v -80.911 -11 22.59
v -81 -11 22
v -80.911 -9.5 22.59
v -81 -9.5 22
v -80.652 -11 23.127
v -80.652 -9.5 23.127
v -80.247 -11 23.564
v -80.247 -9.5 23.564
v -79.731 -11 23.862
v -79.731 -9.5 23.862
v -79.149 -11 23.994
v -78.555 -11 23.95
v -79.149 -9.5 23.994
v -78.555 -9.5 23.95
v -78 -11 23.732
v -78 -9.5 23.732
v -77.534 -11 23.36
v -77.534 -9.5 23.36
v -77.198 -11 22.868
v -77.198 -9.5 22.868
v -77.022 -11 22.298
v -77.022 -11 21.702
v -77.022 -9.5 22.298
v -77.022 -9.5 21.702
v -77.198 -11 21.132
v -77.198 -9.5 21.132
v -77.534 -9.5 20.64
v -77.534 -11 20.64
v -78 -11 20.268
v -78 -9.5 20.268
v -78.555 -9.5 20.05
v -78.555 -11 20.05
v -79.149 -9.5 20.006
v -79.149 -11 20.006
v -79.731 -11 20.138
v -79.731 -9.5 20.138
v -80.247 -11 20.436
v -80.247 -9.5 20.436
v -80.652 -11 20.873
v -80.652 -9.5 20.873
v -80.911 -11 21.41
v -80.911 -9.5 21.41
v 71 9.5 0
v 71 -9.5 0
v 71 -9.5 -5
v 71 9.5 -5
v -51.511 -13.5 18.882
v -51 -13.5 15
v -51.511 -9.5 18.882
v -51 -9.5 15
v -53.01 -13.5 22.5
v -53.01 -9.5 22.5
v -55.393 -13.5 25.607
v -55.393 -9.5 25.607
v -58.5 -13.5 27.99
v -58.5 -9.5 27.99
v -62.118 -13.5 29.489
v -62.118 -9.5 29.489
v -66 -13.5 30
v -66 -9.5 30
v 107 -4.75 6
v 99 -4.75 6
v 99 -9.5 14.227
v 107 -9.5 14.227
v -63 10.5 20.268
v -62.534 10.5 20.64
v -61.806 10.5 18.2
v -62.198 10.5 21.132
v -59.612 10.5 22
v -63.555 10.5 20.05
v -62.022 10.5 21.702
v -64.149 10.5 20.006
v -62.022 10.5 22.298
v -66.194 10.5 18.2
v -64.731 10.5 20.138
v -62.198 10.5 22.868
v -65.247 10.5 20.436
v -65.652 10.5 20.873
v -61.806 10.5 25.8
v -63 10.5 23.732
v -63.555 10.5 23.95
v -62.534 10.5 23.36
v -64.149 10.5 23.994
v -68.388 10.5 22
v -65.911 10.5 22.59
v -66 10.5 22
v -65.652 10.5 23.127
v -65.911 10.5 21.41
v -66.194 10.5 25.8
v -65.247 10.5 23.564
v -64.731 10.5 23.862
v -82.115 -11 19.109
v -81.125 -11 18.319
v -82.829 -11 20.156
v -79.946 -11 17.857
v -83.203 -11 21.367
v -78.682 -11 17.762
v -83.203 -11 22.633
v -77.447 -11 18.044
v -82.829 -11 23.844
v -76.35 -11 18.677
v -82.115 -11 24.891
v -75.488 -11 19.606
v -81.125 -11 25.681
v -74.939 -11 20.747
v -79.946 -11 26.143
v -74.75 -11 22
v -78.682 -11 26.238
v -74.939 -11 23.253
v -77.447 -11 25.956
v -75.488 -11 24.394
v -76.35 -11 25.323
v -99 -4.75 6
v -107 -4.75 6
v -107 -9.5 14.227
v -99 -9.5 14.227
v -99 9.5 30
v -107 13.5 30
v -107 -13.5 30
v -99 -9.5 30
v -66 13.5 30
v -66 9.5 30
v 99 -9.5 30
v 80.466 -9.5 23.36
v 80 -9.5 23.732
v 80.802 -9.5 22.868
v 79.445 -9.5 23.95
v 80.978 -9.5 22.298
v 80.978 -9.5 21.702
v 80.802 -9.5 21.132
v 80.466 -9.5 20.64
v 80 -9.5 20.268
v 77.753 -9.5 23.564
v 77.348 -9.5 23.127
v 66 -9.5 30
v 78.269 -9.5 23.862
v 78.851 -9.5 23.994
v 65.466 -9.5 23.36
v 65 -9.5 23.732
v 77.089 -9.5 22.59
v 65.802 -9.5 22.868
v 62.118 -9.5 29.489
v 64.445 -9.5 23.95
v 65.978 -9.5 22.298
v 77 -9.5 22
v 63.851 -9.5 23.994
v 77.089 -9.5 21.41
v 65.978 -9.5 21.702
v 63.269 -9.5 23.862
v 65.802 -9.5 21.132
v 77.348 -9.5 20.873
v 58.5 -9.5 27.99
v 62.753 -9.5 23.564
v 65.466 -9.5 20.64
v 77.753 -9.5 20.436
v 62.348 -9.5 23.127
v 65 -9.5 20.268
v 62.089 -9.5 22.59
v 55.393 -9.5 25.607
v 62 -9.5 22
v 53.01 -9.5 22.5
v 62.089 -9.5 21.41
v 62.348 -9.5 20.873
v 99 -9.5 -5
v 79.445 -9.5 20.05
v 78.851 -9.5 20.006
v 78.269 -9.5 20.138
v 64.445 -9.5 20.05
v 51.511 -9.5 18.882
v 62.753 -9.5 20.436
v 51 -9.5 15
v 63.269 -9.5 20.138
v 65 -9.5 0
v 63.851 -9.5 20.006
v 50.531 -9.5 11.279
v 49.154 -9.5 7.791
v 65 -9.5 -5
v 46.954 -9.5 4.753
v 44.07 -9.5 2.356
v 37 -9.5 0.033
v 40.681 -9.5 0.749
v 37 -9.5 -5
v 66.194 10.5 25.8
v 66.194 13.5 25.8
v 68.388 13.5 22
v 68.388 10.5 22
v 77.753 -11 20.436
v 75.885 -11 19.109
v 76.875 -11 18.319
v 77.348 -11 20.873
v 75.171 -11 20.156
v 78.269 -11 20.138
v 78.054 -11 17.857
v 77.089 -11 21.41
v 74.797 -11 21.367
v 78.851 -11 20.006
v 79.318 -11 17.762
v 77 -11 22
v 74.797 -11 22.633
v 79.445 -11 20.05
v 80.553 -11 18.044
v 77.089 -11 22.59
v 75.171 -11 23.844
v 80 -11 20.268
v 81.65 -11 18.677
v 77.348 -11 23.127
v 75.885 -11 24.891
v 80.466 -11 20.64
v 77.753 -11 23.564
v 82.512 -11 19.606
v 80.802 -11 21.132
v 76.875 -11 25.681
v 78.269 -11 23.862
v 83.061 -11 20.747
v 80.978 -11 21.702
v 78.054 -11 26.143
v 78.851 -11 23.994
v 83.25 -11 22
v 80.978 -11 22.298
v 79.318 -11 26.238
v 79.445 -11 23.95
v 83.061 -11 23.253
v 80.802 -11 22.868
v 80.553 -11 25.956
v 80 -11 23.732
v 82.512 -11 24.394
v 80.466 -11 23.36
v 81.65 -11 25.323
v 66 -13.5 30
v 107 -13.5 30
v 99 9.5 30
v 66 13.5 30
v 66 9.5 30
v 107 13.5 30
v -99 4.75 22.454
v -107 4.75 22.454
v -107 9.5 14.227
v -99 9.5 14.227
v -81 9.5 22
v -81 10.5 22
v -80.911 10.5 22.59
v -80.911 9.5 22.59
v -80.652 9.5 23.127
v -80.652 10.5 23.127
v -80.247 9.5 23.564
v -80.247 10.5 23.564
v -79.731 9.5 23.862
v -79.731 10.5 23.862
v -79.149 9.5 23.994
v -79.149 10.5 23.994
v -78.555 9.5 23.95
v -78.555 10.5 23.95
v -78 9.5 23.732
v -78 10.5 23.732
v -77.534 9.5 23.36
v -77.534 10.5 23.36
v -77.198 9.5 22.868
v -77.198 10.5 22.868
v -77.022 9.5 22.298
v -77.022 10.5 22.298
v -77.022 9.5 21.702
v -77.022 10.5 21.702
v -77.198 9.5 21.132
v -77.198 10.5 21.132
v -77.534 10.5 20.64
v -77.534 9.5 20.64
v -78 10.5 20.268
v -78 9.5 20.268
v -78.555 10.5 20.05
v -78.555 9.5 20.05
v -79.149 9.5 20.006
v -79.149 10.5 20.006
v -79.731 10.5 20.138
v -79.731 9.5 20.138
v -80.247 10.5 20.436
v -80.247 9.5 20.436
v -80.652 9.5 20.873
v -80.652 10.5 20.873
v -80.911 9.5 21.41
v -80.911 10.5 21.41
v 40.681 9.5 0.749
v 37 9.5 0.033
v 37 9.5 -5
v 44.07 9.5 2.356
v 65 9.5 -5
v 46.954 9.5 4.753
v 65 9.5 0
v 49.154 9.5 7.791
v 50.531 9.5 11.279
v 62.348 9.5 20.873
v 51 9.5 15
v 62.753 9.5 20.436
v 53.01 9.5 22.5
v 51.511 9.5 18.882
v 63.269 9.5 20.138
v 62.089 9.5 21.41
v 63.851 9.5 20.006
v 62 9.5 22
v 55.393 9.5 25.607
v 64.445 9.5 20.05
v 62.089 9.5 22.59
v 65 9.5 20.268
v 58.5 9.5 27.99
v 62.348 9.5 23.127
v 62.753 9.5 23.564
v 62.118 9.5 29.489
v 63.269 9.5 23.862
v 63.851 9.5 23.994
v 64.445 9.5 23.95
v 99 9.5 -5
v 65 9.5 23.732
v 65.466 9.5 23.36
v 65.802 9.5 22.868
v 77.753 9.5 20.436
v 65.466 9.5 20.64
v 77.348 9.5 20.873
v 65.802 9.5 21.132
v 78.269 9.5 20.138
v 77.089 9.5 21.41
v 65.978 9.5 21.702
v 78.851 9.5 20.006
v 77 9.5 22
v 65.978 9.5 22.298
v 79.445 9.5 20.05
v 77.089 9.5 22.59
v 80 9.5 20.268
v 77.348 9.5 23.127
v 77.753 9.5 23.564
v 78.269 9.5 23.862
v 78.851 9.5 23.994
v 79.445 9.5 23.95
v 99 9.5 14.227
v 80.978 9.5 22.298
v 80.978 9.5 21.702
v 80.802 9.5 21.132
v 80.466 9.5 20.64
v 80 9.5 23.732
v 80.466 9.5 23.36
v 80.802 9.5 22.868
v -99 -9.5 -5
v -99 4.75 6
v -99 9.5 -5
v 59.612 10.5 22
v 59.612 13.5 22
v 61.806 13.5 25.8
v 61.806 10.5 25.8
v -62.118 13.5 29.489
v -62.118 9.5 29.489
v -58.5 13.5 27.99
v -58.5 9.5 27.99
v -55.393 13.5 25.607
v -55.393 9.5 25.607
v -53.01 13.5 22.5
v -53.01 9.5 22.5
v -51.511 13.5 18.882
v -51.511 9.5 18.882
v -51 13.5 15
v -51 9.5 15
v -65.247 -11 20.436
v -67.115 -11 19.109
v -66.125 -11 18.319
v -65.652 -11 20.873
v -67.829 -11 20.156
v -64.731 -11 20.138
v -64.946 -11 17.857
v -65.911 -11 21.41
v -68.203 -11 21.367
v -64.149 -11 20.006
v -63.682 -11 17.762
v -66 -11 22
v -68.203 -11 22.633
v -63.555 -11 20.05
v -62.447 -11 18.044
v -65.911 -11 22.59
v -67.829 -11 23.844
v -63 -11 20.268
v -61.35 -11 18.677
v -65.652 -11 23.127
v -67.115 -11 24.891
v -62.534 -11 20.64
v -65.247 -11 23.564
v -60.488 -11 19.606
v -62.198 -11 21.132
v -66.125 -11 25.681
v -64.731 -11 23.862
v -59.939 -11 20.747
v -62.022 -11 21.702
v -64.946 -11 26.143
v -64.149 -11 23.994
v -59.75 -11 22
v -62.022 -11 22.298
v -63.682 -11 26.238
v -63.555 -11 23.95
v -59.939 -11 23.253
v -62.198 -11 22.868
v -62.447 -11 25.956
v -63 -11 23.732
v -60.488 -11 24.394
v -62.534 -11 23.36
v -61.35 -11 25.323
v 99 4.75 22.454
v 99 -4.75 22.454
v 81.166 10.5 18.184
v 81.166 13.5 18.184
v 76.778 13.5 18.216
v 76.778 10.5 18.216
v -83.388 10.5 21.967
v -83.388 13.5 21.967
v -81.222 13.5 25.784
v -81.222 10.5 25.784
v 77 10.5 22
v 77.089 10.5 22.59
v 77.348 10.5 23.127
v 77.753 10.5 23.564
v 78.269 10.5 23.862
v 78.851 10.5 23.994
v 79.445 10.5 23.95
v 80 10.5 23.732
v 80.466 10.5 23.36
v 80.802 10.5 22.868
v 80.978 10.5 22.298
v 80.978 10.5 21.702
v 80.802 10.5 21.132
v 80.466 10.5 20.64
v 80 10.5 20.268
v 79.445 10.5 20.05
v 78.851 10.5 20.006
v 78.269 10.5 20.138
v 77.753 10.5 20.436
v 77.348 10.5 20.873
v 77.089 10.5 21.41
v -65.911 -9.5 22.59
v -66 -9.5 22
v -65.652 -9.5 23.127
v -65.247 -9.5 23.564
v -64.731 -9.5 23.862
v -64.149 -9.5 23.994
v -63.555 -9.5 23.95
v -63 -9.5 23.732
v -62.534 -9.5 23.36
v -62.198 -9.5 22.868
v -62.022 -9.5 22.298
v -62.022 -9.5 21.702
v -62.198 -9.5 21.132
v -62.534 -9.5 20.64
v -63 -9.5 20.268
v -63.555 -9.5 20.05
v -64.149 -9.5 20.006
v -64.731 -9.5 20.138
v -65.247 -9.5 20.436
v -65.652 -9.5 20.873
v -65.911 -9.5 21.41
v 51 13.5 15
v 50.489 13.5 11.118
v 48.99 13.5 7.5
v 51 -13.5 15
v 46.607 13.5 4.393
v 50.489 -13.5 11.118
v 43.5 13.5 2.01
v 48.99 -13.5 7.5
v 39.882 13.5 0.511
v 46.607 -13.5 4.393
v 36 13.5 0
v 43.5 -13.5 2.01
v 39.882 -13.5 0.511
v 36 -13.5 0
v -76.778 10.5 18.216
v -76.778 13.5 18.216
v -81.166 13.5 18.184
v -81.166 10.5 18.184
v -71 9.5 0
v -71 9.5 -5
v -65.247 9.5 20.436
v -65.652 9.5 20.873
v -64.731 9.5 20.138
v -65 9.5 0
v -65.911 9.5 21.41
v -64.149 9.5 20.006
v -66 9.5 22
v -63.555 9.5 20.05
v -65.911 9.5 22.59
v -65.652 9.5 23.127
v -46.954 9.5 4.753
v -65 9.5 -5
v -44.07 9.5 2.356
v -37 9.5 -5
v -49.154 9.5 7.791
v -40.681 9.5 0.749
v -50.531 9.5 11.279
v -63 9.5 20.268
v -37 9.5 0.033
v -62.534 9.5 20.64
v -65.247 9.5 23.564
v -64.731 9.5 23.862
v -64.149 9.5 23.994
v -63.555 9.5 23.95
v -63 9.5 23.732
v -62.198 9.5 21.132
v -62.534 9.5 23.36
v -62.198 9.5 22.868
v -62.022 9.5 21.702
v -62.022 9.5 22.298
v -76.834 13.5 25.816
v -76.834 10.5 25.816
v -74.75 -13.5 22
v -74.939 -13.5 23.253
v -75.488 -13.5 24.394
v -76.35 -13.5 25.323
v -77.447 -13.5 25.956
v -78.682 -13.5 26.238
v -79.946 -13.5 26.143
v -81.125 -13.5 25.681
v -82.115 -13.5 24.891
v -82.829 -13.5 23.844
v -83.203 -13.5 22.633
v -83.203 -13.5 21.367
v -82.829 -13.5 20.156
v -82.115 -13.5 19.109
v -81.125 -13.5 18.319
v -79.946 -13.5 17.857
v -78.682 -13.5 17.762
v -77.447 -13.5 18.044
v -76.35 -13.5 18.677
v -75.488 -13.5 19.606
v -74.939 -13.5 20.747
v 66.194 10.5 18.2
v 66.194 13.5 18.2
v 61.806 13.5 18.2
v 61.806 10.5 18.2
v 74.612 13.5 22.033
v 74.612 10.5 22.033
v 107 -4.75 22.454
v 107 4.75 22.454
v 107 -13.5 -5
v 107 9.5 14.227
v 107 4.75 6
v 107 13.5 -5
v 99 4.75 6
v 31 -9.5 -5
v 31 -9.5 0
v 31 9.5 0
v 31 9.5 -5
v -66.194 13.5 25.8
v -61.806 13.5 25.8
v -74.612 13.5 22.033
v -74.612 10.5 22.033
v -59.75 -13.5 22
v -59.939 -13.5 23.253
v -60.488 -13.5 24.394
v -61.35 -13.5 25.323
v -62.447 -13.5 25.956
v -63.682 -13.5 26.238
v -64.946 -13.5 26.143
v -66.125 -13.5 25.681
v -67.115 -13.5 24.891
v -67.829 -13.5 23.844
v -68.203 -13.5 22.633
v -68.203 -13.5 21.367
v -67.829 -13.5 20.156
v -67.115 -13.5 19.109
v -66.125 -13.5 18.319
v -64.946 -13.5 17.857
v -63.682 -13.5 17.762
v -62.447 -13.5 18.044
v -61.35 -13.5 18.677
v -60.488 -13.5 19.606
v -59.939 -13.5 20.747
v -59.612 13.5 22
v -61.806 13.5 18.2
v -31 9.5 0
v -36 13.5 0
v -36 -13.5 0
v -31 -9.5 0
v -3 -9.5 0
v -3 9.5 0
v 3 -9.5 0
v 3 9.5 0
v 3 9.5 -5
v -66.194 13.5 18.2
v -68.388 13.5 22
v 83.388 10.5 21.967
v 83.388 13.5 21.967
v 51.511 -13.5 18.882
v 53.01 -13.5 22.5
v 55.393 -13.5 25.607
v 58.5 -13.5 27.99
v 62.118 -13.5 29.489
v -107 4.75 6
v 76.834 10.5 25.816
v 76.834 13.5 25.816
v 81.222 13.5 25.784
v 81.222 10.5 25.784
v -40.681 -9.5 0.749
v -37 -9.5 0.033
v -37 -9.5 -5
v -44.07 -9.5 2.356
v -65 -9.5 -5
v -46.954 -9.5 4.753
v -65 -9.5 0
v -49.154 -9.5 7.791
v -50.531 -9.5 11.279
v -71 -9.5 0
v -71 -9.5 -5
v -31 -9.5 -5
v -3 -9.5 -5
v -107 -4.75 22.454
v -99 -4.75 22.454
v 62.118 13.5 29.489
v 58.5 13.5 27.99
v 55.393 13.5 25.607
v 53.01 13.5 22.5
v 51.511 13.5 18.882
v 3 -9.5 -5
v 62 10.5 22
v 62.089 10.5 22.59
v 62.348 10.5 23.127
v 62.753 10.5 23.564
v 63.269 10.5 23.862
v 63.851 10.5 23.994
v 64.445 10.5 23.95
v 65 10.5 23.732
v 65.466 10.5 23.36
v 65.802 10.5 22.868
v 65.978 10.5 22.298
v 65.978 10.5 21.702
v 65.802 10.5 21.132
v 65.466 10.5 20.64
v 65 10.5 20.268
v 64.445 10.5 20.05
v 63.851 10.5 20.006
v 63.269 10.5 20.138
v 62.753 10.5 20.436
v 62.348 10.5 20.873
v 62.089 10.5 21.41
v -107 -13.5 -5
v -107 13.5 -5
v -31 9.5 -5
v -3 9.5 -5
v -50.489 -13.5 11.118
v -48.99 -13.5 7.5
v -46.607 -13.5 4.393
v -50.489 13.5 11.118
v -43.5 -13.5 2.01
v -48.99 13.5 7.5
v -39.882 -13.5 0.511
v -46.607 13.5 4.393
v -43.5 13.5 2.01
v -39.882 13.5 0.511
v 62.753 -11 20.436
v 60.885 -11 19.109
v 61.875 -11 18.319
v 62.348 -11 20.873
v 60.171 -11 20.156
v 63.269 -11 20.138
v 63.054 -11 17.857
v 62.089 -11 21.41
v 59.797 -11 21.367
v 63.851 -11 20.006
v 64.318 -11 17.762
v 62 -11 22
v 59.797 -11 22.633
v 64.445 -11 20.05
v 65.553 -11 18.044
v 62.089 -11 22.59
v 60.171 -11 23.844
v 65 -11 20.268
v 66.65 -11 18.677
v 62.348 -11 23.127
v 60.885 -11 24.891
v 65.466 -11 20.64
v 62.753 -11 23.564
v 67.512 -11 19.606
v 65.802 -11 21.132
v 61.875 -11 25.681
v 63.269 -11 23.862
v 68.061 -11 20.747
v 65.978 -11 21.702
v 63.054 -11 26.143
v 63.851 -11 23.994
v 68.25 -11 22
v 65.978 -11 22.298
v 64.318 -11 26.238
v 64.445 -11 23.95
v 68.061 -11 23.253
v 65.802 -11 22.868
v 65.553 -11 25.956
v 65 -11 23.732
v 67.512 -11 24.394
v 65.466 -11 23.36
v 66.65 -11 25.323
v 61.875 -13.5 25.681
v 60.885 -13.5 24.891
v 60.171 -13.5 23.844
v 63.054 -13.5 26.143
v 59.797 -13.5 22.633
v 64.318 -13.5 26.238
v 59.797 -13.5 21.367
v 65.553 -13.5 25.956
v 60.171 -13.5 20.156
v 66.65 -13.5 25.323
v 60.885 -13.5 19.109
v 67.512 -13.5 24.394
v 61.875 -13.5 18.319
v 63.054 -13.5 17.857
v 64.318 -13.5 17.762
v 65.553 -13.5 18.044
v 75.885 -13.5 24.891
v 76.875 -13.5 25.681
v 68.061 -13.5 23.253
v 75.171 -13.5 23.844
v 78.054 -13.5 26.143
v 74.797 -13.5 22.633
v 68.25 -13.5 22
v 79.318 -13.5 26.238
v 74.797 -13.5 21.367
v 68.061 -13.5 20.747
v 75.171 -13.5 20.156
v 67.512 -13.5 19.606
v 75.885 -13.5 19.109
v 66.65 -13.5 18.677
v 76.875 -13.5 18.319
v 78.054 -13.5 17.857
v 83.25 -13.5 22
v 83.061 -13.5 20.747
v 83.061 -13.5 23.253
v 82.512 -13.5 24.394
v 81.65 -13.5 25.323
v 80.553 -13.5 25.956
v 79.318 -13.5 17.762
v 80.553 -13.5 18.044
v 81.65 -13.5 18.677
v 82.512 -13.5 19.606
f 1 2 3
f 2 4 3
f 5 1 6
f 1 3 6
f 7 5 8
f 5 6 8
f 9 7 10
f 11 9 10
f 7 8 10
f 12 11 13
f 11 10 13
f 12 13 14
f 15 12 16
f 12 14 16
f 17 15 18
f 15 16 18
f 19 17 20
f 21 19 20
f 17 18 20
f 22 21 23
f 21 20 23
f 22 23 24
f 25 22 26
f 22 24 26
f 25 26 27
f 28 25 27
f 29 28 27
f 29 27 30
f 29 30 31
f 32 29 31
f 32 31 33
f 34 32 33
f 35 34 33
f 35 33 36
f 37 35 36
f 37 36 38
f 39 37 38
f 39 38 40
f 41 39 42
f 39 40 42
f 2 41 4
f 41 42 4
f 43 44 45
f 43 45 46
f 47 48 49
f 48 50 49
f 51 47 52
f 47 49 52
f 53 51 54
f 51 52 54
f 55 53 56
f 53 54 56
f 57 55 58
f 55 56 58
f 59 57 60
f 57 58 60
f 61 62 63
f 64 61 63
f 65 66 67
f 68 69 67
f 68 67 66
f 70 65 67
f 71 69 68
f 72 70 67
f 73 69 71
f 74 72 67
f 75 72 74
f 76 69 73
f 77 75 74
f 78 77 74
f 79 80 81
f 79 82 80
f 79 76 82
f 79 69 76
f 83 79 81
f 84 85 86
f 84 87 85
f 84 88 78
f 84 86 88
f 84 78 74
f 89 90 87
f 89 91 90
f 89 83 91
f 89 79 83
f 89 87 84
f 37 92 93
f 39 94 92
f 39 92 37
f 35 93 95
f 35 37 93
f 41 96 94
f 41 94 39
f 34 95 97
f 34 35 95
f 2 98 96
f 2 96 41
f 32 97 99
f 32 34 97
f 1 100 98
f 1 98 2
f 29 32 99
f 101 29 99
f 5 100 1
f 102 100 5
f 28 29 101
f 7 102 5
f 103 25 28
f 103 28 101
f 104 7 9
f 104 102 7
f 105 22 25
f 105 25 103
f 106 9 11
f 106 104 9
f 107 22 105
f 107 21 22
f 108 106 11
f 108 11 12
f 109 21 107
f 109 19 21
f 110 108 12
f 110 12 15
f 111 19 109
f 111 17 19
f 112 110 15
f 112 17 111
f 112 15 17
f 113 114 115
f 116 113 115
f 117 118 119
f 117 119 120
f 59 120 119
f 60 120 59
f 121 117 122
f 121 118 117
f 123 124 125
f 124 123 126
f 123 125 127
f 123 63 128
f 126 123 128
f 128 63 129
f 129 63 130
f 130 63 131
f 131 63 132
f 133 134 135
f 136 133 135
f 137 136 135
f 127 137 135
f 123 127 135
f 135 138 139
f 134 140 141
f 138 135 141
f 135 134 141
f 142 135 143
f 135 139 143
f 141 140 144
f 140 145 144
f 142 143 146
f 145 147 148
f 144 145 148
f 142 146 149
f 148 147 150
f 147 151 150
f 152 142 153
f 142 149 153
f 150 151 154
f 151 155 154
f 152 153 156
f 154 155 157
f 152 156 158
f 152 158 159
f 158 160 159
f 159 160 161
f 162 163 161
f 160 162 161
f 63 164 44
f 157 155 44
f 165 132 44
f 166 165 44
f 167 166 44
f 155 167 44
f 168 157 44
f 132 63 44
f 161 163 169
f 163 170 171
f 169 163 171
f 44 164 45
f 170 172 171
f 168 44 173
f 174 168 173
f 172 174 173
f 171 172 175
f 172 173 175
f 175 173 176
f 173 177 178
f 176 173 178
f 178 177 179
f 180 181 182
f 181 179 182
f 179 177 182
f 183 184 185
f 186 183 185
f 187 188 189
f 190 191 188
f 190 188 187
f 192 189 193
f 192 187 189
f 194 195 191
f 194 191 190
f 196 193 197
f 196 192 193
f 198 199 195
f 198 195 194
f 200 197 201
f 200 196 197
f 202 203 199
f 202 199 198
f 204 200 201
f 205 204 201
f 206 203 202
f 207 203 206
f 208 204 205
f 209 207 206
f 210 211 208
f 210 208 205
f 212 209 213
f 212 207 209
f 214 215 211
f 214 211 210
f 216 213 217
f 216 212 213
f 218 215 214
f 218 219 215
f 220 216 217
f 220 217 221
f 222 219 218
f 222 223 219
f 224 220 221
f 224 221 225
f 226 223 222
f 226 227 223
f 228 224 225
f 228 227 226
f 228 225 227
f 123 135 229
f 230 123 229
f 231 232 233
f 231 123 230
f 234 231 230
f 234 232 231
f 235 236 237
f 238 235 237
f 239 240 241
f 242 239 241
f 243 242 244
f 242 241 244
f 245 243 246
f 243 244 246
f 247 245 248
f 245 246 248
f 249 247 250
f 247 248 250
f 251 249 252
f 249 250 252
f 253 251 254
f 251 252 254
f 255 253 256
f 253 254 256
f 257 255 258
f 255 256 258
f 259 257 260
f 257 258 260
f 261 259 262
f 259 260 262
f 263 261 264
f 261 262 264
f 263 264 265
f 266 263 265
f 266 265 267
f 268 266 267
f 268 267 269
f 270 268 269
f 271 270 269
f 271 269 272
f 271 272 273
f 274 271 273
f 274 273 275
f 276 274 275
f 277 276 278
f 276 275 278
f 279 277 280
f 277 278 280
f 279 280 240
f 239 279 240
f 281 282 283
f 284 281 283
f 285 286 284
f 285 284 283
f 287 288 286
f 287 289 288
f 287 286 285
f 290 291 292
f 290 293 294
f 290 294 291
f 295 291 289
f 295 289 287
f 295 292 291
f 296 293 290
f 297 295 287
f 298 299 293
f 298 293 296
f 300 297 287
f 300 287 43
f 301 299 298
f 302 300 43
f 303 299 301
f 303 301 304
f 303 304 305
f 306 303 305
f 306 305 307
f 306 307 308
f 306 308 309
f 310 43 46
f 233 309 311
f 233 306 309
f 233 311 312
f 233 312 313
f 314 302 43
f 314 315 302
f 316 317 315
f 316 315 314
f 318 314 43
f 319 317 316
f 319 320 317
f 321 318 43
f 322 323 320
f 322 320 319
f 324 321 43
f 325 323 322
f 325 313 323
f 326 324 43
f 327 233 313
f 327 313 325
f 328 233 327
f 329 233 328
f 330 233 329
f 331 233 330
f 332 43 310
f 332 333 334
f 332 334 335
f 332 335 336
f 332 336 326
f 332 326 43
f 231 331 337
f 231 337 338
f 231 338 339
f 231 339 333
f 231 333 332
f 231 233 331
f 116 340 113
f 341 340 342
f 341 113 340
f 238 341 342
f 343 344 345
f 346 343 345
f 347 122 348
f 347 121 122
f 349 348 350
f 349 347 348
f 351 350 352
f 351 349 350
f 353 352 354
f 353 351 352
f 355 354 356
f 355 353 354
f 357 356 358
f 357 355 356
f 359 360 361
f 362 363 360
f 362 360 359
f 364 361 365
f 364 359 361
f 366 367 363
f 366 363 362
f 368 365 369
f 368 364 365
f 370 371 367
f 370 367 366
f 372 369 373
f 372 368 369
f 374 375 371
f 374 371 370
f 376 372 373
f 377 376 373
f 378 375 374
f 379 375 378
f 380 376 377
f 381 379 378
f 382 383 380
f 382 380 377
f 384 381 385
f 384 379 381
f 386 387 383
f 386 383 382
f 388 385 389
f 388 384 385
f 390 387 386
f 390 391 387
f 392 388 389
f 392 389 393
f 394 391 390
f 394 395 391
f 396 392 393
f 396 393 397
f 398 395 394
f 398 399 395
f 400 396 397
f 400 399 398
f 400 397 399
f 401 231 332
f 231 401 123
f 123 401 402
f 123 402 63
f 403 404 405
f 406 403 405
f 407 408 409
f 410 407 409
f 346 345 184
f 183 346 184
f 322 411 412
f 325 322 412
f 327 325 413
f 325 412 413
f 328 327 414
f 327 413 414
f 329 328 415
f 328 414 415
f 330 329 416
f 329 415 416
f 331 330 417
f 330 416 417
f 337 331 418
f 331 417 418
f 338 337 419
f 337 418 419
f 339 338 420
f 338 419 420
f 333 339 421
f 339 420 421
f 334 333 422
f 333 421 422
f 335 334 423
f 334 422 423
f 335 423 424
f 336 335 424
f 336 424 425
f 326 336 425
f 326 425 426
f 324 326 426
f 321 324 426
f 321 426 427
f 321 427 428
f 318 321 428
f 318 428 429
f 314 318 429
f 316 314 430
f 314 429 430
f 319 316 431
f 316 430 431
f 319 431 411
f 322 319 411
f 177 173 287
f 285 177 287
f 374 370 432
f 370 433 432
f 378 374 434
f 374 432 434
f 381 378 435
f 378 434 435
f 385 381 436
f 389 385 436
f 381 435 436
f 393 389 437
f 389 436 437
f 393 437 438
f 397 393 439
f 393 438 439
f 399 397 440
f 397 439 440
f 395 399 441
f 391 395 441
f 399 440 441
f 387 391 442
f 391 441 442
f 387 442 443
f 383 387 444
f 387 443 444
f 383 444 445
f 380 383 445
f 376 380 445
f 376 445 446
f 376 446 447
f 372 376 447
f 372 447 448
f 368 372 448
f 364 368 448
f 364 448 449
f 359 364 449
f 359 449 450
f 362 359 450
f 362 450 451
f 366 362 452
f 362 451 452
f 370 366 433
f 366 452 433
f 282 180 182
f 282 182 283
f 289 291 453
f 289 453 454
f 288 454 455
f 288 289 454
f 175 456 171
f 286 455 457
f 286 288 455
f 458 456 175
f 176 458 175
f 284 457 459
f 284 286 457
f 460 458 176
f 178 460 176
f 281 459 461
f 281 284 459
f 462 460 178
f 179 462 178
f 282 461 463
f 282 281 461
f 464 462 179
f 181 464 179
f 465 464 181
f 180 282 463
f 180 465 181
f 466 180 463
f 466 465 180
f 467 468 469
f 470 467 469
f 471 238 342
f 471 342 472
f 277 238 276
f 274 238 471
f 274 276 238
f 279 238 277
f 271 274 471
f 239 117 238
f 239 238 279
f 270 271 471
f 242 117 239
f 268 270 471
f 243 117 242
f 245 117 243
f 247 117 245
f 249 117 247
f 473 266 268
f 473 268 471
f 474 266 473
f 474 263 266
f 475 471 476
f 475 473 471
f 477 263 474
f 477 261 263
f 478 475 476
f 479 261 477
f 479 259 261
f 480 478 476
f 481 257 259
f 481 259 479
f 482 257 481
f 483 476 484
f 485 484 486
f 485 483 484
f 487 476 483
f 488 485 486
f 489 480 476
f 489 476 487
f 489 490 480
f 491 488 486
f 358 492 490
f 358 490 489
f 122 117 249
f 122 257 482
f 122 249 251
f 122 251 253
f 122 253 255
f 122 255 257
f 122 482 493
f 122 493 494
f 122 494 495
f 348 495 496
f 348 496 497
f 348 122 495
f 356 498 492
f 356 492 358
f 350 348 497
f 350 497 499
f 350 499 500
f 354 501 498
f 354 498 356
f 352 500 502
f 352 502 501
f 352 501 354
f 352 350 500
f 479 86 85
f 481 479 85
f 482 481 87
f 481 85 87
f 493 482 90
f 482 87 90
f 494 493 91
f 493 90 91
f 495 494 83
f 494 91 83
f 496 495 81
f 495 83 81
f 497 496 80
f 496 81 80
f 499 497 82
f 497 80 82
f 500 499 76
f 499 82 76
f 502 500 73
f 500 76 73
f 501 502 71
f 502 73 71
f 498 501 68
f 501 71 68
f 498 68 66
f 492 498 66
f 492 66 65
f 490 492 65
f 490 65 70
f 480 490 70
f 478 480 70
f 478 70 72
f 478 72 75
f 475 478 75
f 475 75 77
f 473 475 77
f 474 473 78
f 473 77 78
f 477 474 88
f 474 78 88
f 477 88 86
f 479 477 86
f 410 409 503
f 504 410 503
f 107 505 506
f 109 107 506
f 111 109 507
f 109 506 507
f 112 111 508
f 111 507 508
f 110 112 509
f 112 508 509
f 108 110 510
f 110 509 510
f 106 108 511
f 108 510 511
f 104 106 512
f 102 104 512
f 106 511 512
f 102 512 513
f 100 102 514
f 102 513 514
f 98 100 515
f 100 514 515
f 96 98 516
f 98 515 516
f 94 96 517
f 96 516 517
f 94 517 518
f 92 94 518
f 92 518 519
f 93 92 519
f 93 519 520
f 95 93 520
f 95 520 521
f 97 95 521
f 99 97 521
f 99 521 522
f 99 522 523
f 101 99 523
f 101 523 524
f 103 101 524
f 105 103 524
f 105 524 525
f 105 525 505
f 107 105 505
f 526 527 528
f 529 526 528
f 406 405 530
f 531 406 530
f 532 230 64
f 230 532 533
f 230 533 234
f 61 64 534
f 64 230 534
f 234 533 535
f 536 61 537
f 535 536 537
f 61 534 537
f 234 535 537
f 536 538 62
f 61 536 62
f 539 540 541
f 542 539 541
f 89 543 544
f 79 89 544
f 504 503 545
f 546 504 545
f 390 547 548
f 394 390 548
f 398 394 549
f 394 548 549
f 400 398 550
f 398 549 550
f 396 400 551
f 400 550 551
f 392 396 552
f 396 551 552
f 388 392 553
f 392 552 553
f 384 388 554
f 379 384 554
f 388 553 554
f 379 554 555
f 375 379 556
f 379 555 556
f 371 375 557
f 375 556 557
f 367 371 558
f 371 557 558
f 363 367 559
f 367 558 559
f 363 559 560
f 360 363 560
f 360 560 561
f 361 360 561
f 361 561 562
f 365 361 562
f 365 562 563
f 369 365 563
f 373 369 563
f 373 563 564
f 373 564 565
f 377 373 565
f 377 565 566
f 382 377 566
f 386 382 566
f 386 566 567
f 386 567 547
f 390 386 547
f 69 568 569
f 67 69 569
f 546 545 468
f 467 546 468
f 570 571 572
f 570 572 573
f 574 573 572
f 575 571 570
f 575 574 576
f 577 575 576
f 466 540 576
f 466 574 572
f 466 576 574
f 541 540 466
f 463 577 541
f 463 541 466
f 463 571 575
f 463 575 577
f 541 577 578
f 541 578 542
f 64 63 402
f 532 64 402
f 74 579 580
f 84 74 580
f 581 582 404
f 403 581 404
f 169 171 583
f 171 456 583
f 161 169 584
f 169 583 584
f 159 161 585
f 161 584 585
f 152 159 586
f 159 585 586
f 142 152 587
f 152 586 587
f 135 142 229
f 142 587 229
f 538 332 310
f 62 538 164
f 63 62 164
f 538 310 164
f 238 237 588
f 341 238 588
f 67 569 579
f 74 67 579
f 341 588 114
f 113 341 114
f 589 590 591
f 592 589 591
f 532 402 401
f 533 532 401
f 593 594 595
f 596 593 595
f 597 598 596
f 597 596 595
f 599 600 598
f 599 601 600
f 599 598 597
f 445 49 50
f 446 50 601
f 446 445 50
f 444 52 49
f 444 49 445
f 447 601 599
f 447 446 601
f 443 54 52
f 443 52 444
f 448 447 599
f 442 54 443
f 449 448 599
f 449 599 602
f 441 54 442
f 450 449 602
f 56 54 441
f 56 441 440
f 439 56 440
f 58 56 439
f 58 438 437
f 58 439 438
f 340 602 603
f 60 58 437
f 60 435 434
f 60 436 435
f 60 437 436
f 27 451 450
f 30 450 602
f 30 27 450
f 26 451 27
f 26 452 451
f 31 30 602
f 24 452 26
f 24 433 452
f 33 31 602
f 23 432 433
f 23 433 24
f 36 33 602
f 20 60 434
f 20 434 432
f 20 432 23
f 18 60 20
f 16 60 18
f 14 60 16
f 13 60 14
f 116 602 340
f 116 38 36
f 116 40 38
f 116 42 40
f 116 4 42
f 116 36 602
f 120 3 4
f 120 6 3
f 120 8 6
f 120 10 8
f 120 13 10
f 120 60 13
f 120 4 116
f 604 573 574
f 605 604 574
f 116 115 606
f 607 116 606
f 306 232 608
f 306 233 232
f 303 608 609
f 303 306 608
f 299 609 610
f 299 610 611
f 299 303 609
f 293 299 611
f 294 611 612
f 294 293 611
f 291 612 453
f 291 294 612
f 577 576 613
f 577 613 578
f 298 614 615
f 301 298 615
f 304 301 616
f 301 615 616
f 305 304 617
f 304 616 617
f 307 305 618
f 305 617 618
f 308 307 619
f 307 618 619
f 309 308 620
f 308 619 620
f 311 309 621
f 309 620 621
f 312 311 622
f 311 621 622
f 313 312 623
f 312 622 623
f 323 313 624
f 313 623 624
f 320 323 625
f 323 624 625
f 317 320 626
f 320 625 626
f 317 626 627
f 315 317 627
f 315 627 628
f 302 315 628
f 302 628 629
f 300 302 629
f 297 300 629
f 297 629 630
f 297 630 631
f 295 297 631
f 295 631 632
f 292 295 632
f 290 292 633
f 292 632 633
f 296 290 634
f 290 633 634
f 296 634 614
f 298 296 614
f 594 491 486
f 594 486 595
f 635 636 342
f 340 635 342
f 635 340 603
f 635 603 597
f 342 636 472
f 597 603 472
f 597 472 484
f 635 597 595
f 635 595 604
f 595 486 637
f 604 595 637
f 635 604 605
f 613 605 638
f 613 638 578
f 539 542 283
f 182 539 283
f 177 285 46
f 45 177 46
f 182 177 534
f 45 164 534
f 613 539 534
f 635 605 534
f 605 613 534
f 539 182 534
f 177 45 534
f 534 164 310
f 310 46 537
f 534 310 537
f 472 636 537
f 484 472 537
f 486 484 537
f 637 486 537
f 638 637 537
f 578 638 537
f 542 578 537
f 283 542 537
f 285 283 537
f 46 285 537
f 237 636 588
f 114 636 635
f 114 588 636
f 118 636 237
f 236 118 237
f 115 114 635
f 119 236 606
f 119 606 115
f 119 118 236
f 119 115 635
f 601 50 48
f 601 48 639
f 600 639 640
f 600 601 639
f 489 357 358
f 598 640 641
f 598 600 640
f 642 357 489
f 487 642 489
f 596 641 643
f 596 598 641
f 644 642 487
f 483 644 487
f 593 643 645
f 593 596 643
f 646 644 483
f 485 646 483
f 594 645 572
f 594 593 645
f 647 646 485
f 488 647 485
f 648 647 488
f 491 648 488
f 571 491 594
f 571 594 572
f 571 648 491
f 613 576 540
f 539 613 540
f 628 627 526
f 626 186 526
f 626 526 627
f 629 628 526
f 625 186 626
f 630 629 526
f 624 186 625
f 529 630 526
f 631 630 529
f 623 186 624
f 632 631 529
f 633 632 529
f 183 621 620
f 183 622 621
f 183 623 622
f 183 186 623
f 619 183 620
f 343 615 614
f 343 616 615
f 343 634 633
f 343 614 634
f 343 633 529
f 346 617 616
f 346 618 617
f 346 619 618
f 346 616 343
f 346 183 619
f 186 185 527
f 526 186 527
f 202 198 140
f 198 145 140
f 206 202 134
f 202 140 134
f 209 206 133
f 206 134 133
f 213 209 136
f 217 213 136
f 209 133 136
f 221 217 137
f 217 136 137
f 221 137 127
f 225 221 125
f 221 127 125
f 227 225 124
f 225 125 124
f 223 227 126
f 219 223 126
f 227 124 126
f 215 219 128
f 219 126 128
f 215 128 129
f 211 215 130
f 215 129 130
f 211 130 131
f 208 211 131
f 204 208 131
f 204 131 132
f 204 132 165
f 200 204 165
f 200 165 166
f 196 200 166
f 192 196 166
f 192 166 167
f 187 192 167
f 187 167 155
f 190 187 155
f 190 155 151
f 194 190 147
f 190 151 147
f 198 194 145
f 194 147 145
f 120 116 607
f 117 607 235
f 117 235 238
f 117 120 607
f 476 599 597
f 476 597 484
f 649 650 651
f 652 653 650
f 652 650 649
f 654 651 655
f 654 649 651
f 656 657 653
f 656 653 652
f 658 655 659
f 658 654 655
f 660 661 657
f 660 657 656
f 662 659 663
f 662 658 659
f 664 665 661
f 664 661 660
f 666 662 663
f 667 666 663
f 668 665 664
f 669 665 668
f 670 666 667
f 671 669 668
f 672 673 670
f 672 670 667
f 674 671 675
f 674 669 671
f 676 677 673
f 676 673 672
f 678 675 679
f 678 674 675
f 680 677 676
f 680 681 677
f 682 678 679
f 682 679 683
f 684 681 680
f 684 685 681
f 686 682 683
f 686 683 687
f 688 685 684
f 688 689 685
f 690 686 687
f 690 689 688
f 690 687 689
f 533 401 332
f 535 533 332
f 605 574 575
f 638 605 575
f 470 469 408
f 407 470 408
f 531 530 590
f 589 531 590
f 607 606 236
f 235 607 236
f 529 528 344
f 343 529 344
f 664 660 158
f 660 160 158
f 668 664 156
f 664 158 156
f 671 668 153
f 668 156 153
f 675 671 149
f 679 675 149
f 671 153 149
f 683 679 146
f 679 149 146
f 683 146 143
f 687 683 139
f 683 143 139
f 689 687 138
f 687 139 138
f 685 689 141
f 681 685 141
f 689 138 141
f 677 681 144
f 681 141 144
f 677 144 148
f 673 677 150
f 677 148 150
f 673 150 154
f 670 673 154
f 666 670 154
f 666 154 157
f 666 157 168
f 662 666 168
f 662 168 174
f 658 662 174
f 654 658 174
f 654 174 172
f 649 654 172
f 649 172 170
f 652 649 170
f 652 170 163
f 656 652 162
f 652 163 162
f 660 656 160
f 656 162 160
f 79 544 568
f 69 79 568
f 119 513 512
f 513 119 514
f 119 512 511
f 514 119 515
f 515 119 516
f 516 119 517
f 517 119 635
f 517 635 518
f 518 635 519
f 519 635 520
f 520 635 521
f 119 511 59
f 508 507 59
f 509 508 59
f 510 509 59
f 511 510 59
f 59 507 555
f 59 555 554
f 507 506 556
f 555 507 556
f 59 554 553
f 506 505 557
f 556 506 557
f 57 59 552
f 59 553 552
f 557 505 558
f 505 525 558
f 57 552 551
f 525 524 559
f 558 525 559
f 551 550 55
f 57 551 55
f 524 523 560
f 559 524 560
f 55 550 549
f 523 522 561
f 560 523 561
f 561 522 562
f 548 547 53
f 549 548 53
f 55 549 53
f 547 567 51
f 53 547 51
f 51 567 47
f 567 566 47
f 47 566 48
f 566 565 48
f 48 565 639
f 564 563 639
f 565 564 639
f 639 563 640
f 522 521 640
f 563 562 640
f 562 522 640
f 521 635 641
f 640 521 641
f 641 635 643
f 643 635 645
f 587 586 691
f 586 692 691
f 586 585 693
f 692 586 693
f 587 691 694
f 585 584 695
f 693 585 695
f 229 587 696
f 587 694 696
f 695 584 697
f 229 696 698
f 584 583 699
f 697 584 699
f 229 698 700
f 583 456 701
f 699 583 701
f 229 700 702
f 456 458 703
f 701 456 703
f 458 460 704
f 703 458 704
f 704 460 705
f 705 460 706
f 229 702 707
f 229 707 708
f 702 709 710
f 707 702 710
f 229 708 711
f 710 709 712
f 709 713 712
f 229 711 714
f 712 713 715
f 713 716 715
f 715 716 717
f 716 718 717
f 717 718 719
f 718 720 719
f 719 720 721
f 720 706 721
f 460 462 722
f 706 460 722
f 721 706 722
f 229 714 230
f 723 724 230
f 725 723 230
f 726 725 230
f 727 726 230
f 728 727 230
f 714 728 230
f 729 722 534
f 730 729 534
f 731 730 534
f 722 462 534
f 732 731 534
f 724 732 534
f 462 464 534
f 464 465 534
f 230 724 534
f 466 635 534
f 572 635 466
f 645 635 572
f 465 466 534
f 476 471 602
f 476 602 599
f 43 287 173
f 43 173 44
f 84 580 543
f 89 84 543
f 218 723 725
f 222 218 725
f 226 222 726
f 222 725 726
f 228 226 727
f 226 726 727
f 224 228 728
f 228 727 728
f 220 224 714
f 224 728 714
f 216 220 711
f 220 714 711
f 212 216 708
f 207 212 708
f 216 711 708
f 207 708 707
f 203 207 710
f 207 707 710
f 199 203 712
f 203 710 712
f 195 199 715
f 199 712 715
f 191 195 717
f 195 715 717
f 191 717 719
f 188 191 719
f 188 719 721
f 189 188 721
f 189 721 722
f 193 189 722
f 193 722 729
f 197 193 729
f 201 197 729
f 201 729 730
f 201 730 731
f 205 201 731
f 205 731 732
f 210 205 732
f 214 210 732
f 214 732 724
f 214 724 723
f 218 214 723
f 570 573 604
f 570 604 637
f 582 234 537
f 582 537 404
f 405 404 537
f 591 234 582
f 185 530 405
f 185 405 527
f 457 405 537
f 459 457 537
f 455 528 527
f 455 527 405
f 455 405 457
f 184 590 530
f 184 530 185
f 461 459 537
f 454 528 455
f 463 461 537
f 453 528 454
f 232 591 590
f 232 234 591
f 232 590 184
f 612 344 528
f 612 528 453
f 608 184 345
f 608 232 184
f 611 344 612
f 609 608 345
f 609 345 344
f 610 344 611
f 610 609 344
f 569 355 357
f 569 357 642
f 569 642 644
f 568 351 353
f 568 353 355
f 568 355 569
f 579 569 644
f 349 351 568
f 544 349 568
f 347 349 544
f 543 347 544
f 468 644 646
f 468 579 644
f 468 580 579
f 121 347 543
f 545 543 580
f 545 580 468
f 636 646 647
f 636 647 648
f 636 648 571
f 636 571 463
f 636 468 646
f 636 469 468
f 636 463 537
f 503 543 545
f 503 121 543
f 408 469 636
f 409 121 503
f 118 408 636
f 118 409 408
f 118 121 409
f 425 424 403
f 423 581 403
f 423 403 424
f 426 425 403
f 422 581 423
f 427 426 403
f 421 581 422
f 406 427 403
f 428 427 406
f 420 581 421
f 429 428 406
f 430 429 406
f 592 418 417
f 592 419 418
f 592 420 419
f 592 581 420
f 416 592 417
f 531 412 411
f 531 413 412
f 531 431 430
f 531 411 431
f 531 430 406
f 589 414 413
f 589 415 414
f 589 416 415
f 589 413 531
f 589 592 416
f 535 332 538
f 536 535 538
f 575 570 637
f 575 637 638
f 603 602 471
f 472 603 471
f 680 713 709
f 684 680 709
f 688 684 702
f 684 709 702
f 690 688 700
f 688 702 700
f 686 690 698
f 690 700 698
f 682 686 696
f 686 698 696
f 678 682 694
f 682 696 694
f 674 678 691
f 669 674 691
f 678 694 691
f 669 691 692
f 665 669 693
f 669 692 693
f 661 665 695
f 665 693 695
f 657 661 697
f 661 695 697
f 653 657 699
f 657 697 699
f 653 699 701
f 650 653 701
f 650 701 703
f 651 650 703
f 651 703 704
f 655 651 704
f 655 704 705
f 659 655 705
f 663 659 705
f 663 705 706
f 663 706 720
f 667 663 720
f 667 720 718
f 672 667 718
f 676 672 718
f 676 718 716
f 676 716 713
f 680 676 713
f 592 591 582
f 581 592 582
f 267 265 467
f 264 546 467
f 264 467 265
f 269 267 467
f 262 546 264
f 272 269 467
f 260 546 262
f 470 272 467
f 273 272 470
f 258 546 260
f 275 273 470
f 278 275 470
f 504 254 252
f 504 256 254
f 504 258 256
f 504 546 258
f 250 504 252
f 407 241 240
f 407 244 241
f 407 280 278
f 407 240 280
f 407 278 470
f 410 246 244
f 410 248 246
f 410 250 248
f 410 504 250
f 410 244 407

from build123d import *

# Parameters (mm, degrees)
F0_W           = 28
F0_H           = 19
F0_W_2         = 6
F1_DEPTH       = 5
F2_DEPTH       = 30
F3_R           = 14.99999
F6_D           = 4
F6_CBORE_D     = 8.5
F6_CBORE_DEPTH = 2.5
F7_R           = 2
F8_DEPTH       = 3
F10_DEPTH      = 214.001


# Not quite as in the source:
# - a fillet or chamfer is up to 0.001 mm smaller than in the source, because OpenCascade refuses the exact size
# - a feature names something its author has since deleted; it is built from what else it names


with BuildPart() as f1:
    # F0 (on Top) → F1 (new body)
    with BuildSketch(Plane.XY):
        Polygon((-107, 13.5), (-107, -13.5), (-51, -13.5), (-51, -9.5), (-65, -9.5), (-71, -9.5), (-99, -9.5), (-99, 9.5), (-71, 9.5), (-65, 9.5), (-51, 9.5), (-51, 13.5), align=None)
        Polygon((-51, -9.5), (-51, -13.5), (51, -13.5), (51, -9.5), (37, -9.5), (37, 9.5), (51, 9.5), (51, 13.5), (-51, 13.5), (-51, 9.5), (-37, 9.5), (-37, -9.5), align=None)
        with Locations((-17, 0)):
            Rectangle(F0_W, F0_H, mode=Mode.SUBTRACT)
        with Locations((17, 0)):
            Rectangle(F0_W, F0_H, mode=Mode.SUBTRACT)
        Polygon((51, -9.5), (51, -13.5), (107, -13.5), (107, 13.5), (51, 13.5), (51, 9.5), (65, 9.5), (71, 9.5), (99, 9.5), (99, -9.5), (71, -9.5), (65, -9.5), align=None)
        with Locations((-68, 0)):
            Rectangle(F0_W_2, F0_H)
        with Locations((68, 0)):
            Rectangle(F0_W_2, F0_H)
    extrude(amount=-F1_DEPTH)

    # F0 (on Top) → F2 (join)
    with BuildSketch(Plane.XY):
        Polygon((51, -9.5), (51, -13.5), (107, -13.5), (107, 13.5), (51, 13.5), (51, 9.5), (65, 9.5), (71, 9.5), (99, 9.5), (99, -9.5), (71, -9.5), (65, -9.5), align=None)
        Polygon((-107, 13.5), (-107, -13.5), (-51, -13.5), (-51, -9.5), (-65, -9.5), (-71, -9.5), (-99, -9.5), (-99, 9.5), (-71, 9.5), (-65, 9.5), (-51, 9.5), (-51, 13.5), align=None)
    extrude(amount=F2_DEPTH)

    # F3 (radius 15 in the source; OpenCascade refuses exactly that, so slightly less here)
    f3_edges = [f1.edges().sort_by_distance(p)[0] for p in [
        (51, 11.5, 0),
        (51, 11.5, 30),
        (-51, 11.5, 30),
        (-51, 11.5, 0),
        (-51, -11.5, 30),
        (51, -11.5, 30),
    ]]
    fillet(f3_edges, radius=F3_R)

    # F6 (through all)
    with Locations(Plane.XZ.offset(13.5)):
        with Locations((-79, 22), (79, 22), (-64, 22), (64, 22)):
            CounterBoreHole(F6_D / 2, F6_CBORE_D / 2, F6_CBORE_DEPTH)

    # F7 (on face) → F8 (cut)
    with BuildSketch(Plane(origin=(0, 13.5, 0), x_dir=(-1, 0, 0), z_dir=(0, 1, 0))):
        Polygon((-81.1656275844, 18.1837989441), (-76.7778867319, 18.2164109688), (-74.6122591474, 22.0326120247), (-76.8343724156, 25.8162010559), (-81.2221132681, 25.7835890312), (-83.3877408526, 21.9673879753), align=None)
        with Locations((-79, 22)):
            Circle(F7_R, mode=Mode.SUBTRACT)
        Polygon((-59.6121379542, 22), (-61.8060689771, 25.8), (-66.1939310229, 25.8), (-68.3878620458, 22), (-66.1939310229, 18.2), (-61.8060689771, 18.2), align=None)
        with Locations((-64, 22)):
            Circle(F7_R, mode=Mode.SUBTRACT)
        Polygon((61.8060689771, 18.2), (66.1939310229, 18.2), (68.3878620458, 22), (66.1939310229, 25.8), (61.8060689771, 25.8), (59.6121379542, 22), align=None)
        with Locations((64, 22)):
            Circle(F7_R, mode=Mode.SUBTRACT)
        Polygon((76.7778867319, 18.2164109688), (81.1656275844, 18.1837989441), (83.3877408526, 21.9673879753), (81.2221132681, 25.7835890312), (76.8343724156, 25.8162010559), (74.6122591474, 22.0326120247), align=None)
        with Locations((79, 22)):
            Circle(F7_R, mode=Mode.SUBTRACT)
    extrude(amount=-F8_DEPTH, mode=Mode.SUBTRACT)

    # F9 (on face) → F10 (cut, through all)
    with BuildSketch(Plane(origin=(-107, 0, 0), x_dir=(0, -1, 0), z_dir=(-1, 0, 0))):
        Polygon((-4.75, 6), (4.75, 6), (9.5, 14.227241336), (4.75, 22.4544826719), (-4.75, 22.4544826719), (-9.5, 14.227241336), align=None)
    extrude(amount=-F10_DEPTH, mode=Mode.SUBTRACT)


solid = f1.part
